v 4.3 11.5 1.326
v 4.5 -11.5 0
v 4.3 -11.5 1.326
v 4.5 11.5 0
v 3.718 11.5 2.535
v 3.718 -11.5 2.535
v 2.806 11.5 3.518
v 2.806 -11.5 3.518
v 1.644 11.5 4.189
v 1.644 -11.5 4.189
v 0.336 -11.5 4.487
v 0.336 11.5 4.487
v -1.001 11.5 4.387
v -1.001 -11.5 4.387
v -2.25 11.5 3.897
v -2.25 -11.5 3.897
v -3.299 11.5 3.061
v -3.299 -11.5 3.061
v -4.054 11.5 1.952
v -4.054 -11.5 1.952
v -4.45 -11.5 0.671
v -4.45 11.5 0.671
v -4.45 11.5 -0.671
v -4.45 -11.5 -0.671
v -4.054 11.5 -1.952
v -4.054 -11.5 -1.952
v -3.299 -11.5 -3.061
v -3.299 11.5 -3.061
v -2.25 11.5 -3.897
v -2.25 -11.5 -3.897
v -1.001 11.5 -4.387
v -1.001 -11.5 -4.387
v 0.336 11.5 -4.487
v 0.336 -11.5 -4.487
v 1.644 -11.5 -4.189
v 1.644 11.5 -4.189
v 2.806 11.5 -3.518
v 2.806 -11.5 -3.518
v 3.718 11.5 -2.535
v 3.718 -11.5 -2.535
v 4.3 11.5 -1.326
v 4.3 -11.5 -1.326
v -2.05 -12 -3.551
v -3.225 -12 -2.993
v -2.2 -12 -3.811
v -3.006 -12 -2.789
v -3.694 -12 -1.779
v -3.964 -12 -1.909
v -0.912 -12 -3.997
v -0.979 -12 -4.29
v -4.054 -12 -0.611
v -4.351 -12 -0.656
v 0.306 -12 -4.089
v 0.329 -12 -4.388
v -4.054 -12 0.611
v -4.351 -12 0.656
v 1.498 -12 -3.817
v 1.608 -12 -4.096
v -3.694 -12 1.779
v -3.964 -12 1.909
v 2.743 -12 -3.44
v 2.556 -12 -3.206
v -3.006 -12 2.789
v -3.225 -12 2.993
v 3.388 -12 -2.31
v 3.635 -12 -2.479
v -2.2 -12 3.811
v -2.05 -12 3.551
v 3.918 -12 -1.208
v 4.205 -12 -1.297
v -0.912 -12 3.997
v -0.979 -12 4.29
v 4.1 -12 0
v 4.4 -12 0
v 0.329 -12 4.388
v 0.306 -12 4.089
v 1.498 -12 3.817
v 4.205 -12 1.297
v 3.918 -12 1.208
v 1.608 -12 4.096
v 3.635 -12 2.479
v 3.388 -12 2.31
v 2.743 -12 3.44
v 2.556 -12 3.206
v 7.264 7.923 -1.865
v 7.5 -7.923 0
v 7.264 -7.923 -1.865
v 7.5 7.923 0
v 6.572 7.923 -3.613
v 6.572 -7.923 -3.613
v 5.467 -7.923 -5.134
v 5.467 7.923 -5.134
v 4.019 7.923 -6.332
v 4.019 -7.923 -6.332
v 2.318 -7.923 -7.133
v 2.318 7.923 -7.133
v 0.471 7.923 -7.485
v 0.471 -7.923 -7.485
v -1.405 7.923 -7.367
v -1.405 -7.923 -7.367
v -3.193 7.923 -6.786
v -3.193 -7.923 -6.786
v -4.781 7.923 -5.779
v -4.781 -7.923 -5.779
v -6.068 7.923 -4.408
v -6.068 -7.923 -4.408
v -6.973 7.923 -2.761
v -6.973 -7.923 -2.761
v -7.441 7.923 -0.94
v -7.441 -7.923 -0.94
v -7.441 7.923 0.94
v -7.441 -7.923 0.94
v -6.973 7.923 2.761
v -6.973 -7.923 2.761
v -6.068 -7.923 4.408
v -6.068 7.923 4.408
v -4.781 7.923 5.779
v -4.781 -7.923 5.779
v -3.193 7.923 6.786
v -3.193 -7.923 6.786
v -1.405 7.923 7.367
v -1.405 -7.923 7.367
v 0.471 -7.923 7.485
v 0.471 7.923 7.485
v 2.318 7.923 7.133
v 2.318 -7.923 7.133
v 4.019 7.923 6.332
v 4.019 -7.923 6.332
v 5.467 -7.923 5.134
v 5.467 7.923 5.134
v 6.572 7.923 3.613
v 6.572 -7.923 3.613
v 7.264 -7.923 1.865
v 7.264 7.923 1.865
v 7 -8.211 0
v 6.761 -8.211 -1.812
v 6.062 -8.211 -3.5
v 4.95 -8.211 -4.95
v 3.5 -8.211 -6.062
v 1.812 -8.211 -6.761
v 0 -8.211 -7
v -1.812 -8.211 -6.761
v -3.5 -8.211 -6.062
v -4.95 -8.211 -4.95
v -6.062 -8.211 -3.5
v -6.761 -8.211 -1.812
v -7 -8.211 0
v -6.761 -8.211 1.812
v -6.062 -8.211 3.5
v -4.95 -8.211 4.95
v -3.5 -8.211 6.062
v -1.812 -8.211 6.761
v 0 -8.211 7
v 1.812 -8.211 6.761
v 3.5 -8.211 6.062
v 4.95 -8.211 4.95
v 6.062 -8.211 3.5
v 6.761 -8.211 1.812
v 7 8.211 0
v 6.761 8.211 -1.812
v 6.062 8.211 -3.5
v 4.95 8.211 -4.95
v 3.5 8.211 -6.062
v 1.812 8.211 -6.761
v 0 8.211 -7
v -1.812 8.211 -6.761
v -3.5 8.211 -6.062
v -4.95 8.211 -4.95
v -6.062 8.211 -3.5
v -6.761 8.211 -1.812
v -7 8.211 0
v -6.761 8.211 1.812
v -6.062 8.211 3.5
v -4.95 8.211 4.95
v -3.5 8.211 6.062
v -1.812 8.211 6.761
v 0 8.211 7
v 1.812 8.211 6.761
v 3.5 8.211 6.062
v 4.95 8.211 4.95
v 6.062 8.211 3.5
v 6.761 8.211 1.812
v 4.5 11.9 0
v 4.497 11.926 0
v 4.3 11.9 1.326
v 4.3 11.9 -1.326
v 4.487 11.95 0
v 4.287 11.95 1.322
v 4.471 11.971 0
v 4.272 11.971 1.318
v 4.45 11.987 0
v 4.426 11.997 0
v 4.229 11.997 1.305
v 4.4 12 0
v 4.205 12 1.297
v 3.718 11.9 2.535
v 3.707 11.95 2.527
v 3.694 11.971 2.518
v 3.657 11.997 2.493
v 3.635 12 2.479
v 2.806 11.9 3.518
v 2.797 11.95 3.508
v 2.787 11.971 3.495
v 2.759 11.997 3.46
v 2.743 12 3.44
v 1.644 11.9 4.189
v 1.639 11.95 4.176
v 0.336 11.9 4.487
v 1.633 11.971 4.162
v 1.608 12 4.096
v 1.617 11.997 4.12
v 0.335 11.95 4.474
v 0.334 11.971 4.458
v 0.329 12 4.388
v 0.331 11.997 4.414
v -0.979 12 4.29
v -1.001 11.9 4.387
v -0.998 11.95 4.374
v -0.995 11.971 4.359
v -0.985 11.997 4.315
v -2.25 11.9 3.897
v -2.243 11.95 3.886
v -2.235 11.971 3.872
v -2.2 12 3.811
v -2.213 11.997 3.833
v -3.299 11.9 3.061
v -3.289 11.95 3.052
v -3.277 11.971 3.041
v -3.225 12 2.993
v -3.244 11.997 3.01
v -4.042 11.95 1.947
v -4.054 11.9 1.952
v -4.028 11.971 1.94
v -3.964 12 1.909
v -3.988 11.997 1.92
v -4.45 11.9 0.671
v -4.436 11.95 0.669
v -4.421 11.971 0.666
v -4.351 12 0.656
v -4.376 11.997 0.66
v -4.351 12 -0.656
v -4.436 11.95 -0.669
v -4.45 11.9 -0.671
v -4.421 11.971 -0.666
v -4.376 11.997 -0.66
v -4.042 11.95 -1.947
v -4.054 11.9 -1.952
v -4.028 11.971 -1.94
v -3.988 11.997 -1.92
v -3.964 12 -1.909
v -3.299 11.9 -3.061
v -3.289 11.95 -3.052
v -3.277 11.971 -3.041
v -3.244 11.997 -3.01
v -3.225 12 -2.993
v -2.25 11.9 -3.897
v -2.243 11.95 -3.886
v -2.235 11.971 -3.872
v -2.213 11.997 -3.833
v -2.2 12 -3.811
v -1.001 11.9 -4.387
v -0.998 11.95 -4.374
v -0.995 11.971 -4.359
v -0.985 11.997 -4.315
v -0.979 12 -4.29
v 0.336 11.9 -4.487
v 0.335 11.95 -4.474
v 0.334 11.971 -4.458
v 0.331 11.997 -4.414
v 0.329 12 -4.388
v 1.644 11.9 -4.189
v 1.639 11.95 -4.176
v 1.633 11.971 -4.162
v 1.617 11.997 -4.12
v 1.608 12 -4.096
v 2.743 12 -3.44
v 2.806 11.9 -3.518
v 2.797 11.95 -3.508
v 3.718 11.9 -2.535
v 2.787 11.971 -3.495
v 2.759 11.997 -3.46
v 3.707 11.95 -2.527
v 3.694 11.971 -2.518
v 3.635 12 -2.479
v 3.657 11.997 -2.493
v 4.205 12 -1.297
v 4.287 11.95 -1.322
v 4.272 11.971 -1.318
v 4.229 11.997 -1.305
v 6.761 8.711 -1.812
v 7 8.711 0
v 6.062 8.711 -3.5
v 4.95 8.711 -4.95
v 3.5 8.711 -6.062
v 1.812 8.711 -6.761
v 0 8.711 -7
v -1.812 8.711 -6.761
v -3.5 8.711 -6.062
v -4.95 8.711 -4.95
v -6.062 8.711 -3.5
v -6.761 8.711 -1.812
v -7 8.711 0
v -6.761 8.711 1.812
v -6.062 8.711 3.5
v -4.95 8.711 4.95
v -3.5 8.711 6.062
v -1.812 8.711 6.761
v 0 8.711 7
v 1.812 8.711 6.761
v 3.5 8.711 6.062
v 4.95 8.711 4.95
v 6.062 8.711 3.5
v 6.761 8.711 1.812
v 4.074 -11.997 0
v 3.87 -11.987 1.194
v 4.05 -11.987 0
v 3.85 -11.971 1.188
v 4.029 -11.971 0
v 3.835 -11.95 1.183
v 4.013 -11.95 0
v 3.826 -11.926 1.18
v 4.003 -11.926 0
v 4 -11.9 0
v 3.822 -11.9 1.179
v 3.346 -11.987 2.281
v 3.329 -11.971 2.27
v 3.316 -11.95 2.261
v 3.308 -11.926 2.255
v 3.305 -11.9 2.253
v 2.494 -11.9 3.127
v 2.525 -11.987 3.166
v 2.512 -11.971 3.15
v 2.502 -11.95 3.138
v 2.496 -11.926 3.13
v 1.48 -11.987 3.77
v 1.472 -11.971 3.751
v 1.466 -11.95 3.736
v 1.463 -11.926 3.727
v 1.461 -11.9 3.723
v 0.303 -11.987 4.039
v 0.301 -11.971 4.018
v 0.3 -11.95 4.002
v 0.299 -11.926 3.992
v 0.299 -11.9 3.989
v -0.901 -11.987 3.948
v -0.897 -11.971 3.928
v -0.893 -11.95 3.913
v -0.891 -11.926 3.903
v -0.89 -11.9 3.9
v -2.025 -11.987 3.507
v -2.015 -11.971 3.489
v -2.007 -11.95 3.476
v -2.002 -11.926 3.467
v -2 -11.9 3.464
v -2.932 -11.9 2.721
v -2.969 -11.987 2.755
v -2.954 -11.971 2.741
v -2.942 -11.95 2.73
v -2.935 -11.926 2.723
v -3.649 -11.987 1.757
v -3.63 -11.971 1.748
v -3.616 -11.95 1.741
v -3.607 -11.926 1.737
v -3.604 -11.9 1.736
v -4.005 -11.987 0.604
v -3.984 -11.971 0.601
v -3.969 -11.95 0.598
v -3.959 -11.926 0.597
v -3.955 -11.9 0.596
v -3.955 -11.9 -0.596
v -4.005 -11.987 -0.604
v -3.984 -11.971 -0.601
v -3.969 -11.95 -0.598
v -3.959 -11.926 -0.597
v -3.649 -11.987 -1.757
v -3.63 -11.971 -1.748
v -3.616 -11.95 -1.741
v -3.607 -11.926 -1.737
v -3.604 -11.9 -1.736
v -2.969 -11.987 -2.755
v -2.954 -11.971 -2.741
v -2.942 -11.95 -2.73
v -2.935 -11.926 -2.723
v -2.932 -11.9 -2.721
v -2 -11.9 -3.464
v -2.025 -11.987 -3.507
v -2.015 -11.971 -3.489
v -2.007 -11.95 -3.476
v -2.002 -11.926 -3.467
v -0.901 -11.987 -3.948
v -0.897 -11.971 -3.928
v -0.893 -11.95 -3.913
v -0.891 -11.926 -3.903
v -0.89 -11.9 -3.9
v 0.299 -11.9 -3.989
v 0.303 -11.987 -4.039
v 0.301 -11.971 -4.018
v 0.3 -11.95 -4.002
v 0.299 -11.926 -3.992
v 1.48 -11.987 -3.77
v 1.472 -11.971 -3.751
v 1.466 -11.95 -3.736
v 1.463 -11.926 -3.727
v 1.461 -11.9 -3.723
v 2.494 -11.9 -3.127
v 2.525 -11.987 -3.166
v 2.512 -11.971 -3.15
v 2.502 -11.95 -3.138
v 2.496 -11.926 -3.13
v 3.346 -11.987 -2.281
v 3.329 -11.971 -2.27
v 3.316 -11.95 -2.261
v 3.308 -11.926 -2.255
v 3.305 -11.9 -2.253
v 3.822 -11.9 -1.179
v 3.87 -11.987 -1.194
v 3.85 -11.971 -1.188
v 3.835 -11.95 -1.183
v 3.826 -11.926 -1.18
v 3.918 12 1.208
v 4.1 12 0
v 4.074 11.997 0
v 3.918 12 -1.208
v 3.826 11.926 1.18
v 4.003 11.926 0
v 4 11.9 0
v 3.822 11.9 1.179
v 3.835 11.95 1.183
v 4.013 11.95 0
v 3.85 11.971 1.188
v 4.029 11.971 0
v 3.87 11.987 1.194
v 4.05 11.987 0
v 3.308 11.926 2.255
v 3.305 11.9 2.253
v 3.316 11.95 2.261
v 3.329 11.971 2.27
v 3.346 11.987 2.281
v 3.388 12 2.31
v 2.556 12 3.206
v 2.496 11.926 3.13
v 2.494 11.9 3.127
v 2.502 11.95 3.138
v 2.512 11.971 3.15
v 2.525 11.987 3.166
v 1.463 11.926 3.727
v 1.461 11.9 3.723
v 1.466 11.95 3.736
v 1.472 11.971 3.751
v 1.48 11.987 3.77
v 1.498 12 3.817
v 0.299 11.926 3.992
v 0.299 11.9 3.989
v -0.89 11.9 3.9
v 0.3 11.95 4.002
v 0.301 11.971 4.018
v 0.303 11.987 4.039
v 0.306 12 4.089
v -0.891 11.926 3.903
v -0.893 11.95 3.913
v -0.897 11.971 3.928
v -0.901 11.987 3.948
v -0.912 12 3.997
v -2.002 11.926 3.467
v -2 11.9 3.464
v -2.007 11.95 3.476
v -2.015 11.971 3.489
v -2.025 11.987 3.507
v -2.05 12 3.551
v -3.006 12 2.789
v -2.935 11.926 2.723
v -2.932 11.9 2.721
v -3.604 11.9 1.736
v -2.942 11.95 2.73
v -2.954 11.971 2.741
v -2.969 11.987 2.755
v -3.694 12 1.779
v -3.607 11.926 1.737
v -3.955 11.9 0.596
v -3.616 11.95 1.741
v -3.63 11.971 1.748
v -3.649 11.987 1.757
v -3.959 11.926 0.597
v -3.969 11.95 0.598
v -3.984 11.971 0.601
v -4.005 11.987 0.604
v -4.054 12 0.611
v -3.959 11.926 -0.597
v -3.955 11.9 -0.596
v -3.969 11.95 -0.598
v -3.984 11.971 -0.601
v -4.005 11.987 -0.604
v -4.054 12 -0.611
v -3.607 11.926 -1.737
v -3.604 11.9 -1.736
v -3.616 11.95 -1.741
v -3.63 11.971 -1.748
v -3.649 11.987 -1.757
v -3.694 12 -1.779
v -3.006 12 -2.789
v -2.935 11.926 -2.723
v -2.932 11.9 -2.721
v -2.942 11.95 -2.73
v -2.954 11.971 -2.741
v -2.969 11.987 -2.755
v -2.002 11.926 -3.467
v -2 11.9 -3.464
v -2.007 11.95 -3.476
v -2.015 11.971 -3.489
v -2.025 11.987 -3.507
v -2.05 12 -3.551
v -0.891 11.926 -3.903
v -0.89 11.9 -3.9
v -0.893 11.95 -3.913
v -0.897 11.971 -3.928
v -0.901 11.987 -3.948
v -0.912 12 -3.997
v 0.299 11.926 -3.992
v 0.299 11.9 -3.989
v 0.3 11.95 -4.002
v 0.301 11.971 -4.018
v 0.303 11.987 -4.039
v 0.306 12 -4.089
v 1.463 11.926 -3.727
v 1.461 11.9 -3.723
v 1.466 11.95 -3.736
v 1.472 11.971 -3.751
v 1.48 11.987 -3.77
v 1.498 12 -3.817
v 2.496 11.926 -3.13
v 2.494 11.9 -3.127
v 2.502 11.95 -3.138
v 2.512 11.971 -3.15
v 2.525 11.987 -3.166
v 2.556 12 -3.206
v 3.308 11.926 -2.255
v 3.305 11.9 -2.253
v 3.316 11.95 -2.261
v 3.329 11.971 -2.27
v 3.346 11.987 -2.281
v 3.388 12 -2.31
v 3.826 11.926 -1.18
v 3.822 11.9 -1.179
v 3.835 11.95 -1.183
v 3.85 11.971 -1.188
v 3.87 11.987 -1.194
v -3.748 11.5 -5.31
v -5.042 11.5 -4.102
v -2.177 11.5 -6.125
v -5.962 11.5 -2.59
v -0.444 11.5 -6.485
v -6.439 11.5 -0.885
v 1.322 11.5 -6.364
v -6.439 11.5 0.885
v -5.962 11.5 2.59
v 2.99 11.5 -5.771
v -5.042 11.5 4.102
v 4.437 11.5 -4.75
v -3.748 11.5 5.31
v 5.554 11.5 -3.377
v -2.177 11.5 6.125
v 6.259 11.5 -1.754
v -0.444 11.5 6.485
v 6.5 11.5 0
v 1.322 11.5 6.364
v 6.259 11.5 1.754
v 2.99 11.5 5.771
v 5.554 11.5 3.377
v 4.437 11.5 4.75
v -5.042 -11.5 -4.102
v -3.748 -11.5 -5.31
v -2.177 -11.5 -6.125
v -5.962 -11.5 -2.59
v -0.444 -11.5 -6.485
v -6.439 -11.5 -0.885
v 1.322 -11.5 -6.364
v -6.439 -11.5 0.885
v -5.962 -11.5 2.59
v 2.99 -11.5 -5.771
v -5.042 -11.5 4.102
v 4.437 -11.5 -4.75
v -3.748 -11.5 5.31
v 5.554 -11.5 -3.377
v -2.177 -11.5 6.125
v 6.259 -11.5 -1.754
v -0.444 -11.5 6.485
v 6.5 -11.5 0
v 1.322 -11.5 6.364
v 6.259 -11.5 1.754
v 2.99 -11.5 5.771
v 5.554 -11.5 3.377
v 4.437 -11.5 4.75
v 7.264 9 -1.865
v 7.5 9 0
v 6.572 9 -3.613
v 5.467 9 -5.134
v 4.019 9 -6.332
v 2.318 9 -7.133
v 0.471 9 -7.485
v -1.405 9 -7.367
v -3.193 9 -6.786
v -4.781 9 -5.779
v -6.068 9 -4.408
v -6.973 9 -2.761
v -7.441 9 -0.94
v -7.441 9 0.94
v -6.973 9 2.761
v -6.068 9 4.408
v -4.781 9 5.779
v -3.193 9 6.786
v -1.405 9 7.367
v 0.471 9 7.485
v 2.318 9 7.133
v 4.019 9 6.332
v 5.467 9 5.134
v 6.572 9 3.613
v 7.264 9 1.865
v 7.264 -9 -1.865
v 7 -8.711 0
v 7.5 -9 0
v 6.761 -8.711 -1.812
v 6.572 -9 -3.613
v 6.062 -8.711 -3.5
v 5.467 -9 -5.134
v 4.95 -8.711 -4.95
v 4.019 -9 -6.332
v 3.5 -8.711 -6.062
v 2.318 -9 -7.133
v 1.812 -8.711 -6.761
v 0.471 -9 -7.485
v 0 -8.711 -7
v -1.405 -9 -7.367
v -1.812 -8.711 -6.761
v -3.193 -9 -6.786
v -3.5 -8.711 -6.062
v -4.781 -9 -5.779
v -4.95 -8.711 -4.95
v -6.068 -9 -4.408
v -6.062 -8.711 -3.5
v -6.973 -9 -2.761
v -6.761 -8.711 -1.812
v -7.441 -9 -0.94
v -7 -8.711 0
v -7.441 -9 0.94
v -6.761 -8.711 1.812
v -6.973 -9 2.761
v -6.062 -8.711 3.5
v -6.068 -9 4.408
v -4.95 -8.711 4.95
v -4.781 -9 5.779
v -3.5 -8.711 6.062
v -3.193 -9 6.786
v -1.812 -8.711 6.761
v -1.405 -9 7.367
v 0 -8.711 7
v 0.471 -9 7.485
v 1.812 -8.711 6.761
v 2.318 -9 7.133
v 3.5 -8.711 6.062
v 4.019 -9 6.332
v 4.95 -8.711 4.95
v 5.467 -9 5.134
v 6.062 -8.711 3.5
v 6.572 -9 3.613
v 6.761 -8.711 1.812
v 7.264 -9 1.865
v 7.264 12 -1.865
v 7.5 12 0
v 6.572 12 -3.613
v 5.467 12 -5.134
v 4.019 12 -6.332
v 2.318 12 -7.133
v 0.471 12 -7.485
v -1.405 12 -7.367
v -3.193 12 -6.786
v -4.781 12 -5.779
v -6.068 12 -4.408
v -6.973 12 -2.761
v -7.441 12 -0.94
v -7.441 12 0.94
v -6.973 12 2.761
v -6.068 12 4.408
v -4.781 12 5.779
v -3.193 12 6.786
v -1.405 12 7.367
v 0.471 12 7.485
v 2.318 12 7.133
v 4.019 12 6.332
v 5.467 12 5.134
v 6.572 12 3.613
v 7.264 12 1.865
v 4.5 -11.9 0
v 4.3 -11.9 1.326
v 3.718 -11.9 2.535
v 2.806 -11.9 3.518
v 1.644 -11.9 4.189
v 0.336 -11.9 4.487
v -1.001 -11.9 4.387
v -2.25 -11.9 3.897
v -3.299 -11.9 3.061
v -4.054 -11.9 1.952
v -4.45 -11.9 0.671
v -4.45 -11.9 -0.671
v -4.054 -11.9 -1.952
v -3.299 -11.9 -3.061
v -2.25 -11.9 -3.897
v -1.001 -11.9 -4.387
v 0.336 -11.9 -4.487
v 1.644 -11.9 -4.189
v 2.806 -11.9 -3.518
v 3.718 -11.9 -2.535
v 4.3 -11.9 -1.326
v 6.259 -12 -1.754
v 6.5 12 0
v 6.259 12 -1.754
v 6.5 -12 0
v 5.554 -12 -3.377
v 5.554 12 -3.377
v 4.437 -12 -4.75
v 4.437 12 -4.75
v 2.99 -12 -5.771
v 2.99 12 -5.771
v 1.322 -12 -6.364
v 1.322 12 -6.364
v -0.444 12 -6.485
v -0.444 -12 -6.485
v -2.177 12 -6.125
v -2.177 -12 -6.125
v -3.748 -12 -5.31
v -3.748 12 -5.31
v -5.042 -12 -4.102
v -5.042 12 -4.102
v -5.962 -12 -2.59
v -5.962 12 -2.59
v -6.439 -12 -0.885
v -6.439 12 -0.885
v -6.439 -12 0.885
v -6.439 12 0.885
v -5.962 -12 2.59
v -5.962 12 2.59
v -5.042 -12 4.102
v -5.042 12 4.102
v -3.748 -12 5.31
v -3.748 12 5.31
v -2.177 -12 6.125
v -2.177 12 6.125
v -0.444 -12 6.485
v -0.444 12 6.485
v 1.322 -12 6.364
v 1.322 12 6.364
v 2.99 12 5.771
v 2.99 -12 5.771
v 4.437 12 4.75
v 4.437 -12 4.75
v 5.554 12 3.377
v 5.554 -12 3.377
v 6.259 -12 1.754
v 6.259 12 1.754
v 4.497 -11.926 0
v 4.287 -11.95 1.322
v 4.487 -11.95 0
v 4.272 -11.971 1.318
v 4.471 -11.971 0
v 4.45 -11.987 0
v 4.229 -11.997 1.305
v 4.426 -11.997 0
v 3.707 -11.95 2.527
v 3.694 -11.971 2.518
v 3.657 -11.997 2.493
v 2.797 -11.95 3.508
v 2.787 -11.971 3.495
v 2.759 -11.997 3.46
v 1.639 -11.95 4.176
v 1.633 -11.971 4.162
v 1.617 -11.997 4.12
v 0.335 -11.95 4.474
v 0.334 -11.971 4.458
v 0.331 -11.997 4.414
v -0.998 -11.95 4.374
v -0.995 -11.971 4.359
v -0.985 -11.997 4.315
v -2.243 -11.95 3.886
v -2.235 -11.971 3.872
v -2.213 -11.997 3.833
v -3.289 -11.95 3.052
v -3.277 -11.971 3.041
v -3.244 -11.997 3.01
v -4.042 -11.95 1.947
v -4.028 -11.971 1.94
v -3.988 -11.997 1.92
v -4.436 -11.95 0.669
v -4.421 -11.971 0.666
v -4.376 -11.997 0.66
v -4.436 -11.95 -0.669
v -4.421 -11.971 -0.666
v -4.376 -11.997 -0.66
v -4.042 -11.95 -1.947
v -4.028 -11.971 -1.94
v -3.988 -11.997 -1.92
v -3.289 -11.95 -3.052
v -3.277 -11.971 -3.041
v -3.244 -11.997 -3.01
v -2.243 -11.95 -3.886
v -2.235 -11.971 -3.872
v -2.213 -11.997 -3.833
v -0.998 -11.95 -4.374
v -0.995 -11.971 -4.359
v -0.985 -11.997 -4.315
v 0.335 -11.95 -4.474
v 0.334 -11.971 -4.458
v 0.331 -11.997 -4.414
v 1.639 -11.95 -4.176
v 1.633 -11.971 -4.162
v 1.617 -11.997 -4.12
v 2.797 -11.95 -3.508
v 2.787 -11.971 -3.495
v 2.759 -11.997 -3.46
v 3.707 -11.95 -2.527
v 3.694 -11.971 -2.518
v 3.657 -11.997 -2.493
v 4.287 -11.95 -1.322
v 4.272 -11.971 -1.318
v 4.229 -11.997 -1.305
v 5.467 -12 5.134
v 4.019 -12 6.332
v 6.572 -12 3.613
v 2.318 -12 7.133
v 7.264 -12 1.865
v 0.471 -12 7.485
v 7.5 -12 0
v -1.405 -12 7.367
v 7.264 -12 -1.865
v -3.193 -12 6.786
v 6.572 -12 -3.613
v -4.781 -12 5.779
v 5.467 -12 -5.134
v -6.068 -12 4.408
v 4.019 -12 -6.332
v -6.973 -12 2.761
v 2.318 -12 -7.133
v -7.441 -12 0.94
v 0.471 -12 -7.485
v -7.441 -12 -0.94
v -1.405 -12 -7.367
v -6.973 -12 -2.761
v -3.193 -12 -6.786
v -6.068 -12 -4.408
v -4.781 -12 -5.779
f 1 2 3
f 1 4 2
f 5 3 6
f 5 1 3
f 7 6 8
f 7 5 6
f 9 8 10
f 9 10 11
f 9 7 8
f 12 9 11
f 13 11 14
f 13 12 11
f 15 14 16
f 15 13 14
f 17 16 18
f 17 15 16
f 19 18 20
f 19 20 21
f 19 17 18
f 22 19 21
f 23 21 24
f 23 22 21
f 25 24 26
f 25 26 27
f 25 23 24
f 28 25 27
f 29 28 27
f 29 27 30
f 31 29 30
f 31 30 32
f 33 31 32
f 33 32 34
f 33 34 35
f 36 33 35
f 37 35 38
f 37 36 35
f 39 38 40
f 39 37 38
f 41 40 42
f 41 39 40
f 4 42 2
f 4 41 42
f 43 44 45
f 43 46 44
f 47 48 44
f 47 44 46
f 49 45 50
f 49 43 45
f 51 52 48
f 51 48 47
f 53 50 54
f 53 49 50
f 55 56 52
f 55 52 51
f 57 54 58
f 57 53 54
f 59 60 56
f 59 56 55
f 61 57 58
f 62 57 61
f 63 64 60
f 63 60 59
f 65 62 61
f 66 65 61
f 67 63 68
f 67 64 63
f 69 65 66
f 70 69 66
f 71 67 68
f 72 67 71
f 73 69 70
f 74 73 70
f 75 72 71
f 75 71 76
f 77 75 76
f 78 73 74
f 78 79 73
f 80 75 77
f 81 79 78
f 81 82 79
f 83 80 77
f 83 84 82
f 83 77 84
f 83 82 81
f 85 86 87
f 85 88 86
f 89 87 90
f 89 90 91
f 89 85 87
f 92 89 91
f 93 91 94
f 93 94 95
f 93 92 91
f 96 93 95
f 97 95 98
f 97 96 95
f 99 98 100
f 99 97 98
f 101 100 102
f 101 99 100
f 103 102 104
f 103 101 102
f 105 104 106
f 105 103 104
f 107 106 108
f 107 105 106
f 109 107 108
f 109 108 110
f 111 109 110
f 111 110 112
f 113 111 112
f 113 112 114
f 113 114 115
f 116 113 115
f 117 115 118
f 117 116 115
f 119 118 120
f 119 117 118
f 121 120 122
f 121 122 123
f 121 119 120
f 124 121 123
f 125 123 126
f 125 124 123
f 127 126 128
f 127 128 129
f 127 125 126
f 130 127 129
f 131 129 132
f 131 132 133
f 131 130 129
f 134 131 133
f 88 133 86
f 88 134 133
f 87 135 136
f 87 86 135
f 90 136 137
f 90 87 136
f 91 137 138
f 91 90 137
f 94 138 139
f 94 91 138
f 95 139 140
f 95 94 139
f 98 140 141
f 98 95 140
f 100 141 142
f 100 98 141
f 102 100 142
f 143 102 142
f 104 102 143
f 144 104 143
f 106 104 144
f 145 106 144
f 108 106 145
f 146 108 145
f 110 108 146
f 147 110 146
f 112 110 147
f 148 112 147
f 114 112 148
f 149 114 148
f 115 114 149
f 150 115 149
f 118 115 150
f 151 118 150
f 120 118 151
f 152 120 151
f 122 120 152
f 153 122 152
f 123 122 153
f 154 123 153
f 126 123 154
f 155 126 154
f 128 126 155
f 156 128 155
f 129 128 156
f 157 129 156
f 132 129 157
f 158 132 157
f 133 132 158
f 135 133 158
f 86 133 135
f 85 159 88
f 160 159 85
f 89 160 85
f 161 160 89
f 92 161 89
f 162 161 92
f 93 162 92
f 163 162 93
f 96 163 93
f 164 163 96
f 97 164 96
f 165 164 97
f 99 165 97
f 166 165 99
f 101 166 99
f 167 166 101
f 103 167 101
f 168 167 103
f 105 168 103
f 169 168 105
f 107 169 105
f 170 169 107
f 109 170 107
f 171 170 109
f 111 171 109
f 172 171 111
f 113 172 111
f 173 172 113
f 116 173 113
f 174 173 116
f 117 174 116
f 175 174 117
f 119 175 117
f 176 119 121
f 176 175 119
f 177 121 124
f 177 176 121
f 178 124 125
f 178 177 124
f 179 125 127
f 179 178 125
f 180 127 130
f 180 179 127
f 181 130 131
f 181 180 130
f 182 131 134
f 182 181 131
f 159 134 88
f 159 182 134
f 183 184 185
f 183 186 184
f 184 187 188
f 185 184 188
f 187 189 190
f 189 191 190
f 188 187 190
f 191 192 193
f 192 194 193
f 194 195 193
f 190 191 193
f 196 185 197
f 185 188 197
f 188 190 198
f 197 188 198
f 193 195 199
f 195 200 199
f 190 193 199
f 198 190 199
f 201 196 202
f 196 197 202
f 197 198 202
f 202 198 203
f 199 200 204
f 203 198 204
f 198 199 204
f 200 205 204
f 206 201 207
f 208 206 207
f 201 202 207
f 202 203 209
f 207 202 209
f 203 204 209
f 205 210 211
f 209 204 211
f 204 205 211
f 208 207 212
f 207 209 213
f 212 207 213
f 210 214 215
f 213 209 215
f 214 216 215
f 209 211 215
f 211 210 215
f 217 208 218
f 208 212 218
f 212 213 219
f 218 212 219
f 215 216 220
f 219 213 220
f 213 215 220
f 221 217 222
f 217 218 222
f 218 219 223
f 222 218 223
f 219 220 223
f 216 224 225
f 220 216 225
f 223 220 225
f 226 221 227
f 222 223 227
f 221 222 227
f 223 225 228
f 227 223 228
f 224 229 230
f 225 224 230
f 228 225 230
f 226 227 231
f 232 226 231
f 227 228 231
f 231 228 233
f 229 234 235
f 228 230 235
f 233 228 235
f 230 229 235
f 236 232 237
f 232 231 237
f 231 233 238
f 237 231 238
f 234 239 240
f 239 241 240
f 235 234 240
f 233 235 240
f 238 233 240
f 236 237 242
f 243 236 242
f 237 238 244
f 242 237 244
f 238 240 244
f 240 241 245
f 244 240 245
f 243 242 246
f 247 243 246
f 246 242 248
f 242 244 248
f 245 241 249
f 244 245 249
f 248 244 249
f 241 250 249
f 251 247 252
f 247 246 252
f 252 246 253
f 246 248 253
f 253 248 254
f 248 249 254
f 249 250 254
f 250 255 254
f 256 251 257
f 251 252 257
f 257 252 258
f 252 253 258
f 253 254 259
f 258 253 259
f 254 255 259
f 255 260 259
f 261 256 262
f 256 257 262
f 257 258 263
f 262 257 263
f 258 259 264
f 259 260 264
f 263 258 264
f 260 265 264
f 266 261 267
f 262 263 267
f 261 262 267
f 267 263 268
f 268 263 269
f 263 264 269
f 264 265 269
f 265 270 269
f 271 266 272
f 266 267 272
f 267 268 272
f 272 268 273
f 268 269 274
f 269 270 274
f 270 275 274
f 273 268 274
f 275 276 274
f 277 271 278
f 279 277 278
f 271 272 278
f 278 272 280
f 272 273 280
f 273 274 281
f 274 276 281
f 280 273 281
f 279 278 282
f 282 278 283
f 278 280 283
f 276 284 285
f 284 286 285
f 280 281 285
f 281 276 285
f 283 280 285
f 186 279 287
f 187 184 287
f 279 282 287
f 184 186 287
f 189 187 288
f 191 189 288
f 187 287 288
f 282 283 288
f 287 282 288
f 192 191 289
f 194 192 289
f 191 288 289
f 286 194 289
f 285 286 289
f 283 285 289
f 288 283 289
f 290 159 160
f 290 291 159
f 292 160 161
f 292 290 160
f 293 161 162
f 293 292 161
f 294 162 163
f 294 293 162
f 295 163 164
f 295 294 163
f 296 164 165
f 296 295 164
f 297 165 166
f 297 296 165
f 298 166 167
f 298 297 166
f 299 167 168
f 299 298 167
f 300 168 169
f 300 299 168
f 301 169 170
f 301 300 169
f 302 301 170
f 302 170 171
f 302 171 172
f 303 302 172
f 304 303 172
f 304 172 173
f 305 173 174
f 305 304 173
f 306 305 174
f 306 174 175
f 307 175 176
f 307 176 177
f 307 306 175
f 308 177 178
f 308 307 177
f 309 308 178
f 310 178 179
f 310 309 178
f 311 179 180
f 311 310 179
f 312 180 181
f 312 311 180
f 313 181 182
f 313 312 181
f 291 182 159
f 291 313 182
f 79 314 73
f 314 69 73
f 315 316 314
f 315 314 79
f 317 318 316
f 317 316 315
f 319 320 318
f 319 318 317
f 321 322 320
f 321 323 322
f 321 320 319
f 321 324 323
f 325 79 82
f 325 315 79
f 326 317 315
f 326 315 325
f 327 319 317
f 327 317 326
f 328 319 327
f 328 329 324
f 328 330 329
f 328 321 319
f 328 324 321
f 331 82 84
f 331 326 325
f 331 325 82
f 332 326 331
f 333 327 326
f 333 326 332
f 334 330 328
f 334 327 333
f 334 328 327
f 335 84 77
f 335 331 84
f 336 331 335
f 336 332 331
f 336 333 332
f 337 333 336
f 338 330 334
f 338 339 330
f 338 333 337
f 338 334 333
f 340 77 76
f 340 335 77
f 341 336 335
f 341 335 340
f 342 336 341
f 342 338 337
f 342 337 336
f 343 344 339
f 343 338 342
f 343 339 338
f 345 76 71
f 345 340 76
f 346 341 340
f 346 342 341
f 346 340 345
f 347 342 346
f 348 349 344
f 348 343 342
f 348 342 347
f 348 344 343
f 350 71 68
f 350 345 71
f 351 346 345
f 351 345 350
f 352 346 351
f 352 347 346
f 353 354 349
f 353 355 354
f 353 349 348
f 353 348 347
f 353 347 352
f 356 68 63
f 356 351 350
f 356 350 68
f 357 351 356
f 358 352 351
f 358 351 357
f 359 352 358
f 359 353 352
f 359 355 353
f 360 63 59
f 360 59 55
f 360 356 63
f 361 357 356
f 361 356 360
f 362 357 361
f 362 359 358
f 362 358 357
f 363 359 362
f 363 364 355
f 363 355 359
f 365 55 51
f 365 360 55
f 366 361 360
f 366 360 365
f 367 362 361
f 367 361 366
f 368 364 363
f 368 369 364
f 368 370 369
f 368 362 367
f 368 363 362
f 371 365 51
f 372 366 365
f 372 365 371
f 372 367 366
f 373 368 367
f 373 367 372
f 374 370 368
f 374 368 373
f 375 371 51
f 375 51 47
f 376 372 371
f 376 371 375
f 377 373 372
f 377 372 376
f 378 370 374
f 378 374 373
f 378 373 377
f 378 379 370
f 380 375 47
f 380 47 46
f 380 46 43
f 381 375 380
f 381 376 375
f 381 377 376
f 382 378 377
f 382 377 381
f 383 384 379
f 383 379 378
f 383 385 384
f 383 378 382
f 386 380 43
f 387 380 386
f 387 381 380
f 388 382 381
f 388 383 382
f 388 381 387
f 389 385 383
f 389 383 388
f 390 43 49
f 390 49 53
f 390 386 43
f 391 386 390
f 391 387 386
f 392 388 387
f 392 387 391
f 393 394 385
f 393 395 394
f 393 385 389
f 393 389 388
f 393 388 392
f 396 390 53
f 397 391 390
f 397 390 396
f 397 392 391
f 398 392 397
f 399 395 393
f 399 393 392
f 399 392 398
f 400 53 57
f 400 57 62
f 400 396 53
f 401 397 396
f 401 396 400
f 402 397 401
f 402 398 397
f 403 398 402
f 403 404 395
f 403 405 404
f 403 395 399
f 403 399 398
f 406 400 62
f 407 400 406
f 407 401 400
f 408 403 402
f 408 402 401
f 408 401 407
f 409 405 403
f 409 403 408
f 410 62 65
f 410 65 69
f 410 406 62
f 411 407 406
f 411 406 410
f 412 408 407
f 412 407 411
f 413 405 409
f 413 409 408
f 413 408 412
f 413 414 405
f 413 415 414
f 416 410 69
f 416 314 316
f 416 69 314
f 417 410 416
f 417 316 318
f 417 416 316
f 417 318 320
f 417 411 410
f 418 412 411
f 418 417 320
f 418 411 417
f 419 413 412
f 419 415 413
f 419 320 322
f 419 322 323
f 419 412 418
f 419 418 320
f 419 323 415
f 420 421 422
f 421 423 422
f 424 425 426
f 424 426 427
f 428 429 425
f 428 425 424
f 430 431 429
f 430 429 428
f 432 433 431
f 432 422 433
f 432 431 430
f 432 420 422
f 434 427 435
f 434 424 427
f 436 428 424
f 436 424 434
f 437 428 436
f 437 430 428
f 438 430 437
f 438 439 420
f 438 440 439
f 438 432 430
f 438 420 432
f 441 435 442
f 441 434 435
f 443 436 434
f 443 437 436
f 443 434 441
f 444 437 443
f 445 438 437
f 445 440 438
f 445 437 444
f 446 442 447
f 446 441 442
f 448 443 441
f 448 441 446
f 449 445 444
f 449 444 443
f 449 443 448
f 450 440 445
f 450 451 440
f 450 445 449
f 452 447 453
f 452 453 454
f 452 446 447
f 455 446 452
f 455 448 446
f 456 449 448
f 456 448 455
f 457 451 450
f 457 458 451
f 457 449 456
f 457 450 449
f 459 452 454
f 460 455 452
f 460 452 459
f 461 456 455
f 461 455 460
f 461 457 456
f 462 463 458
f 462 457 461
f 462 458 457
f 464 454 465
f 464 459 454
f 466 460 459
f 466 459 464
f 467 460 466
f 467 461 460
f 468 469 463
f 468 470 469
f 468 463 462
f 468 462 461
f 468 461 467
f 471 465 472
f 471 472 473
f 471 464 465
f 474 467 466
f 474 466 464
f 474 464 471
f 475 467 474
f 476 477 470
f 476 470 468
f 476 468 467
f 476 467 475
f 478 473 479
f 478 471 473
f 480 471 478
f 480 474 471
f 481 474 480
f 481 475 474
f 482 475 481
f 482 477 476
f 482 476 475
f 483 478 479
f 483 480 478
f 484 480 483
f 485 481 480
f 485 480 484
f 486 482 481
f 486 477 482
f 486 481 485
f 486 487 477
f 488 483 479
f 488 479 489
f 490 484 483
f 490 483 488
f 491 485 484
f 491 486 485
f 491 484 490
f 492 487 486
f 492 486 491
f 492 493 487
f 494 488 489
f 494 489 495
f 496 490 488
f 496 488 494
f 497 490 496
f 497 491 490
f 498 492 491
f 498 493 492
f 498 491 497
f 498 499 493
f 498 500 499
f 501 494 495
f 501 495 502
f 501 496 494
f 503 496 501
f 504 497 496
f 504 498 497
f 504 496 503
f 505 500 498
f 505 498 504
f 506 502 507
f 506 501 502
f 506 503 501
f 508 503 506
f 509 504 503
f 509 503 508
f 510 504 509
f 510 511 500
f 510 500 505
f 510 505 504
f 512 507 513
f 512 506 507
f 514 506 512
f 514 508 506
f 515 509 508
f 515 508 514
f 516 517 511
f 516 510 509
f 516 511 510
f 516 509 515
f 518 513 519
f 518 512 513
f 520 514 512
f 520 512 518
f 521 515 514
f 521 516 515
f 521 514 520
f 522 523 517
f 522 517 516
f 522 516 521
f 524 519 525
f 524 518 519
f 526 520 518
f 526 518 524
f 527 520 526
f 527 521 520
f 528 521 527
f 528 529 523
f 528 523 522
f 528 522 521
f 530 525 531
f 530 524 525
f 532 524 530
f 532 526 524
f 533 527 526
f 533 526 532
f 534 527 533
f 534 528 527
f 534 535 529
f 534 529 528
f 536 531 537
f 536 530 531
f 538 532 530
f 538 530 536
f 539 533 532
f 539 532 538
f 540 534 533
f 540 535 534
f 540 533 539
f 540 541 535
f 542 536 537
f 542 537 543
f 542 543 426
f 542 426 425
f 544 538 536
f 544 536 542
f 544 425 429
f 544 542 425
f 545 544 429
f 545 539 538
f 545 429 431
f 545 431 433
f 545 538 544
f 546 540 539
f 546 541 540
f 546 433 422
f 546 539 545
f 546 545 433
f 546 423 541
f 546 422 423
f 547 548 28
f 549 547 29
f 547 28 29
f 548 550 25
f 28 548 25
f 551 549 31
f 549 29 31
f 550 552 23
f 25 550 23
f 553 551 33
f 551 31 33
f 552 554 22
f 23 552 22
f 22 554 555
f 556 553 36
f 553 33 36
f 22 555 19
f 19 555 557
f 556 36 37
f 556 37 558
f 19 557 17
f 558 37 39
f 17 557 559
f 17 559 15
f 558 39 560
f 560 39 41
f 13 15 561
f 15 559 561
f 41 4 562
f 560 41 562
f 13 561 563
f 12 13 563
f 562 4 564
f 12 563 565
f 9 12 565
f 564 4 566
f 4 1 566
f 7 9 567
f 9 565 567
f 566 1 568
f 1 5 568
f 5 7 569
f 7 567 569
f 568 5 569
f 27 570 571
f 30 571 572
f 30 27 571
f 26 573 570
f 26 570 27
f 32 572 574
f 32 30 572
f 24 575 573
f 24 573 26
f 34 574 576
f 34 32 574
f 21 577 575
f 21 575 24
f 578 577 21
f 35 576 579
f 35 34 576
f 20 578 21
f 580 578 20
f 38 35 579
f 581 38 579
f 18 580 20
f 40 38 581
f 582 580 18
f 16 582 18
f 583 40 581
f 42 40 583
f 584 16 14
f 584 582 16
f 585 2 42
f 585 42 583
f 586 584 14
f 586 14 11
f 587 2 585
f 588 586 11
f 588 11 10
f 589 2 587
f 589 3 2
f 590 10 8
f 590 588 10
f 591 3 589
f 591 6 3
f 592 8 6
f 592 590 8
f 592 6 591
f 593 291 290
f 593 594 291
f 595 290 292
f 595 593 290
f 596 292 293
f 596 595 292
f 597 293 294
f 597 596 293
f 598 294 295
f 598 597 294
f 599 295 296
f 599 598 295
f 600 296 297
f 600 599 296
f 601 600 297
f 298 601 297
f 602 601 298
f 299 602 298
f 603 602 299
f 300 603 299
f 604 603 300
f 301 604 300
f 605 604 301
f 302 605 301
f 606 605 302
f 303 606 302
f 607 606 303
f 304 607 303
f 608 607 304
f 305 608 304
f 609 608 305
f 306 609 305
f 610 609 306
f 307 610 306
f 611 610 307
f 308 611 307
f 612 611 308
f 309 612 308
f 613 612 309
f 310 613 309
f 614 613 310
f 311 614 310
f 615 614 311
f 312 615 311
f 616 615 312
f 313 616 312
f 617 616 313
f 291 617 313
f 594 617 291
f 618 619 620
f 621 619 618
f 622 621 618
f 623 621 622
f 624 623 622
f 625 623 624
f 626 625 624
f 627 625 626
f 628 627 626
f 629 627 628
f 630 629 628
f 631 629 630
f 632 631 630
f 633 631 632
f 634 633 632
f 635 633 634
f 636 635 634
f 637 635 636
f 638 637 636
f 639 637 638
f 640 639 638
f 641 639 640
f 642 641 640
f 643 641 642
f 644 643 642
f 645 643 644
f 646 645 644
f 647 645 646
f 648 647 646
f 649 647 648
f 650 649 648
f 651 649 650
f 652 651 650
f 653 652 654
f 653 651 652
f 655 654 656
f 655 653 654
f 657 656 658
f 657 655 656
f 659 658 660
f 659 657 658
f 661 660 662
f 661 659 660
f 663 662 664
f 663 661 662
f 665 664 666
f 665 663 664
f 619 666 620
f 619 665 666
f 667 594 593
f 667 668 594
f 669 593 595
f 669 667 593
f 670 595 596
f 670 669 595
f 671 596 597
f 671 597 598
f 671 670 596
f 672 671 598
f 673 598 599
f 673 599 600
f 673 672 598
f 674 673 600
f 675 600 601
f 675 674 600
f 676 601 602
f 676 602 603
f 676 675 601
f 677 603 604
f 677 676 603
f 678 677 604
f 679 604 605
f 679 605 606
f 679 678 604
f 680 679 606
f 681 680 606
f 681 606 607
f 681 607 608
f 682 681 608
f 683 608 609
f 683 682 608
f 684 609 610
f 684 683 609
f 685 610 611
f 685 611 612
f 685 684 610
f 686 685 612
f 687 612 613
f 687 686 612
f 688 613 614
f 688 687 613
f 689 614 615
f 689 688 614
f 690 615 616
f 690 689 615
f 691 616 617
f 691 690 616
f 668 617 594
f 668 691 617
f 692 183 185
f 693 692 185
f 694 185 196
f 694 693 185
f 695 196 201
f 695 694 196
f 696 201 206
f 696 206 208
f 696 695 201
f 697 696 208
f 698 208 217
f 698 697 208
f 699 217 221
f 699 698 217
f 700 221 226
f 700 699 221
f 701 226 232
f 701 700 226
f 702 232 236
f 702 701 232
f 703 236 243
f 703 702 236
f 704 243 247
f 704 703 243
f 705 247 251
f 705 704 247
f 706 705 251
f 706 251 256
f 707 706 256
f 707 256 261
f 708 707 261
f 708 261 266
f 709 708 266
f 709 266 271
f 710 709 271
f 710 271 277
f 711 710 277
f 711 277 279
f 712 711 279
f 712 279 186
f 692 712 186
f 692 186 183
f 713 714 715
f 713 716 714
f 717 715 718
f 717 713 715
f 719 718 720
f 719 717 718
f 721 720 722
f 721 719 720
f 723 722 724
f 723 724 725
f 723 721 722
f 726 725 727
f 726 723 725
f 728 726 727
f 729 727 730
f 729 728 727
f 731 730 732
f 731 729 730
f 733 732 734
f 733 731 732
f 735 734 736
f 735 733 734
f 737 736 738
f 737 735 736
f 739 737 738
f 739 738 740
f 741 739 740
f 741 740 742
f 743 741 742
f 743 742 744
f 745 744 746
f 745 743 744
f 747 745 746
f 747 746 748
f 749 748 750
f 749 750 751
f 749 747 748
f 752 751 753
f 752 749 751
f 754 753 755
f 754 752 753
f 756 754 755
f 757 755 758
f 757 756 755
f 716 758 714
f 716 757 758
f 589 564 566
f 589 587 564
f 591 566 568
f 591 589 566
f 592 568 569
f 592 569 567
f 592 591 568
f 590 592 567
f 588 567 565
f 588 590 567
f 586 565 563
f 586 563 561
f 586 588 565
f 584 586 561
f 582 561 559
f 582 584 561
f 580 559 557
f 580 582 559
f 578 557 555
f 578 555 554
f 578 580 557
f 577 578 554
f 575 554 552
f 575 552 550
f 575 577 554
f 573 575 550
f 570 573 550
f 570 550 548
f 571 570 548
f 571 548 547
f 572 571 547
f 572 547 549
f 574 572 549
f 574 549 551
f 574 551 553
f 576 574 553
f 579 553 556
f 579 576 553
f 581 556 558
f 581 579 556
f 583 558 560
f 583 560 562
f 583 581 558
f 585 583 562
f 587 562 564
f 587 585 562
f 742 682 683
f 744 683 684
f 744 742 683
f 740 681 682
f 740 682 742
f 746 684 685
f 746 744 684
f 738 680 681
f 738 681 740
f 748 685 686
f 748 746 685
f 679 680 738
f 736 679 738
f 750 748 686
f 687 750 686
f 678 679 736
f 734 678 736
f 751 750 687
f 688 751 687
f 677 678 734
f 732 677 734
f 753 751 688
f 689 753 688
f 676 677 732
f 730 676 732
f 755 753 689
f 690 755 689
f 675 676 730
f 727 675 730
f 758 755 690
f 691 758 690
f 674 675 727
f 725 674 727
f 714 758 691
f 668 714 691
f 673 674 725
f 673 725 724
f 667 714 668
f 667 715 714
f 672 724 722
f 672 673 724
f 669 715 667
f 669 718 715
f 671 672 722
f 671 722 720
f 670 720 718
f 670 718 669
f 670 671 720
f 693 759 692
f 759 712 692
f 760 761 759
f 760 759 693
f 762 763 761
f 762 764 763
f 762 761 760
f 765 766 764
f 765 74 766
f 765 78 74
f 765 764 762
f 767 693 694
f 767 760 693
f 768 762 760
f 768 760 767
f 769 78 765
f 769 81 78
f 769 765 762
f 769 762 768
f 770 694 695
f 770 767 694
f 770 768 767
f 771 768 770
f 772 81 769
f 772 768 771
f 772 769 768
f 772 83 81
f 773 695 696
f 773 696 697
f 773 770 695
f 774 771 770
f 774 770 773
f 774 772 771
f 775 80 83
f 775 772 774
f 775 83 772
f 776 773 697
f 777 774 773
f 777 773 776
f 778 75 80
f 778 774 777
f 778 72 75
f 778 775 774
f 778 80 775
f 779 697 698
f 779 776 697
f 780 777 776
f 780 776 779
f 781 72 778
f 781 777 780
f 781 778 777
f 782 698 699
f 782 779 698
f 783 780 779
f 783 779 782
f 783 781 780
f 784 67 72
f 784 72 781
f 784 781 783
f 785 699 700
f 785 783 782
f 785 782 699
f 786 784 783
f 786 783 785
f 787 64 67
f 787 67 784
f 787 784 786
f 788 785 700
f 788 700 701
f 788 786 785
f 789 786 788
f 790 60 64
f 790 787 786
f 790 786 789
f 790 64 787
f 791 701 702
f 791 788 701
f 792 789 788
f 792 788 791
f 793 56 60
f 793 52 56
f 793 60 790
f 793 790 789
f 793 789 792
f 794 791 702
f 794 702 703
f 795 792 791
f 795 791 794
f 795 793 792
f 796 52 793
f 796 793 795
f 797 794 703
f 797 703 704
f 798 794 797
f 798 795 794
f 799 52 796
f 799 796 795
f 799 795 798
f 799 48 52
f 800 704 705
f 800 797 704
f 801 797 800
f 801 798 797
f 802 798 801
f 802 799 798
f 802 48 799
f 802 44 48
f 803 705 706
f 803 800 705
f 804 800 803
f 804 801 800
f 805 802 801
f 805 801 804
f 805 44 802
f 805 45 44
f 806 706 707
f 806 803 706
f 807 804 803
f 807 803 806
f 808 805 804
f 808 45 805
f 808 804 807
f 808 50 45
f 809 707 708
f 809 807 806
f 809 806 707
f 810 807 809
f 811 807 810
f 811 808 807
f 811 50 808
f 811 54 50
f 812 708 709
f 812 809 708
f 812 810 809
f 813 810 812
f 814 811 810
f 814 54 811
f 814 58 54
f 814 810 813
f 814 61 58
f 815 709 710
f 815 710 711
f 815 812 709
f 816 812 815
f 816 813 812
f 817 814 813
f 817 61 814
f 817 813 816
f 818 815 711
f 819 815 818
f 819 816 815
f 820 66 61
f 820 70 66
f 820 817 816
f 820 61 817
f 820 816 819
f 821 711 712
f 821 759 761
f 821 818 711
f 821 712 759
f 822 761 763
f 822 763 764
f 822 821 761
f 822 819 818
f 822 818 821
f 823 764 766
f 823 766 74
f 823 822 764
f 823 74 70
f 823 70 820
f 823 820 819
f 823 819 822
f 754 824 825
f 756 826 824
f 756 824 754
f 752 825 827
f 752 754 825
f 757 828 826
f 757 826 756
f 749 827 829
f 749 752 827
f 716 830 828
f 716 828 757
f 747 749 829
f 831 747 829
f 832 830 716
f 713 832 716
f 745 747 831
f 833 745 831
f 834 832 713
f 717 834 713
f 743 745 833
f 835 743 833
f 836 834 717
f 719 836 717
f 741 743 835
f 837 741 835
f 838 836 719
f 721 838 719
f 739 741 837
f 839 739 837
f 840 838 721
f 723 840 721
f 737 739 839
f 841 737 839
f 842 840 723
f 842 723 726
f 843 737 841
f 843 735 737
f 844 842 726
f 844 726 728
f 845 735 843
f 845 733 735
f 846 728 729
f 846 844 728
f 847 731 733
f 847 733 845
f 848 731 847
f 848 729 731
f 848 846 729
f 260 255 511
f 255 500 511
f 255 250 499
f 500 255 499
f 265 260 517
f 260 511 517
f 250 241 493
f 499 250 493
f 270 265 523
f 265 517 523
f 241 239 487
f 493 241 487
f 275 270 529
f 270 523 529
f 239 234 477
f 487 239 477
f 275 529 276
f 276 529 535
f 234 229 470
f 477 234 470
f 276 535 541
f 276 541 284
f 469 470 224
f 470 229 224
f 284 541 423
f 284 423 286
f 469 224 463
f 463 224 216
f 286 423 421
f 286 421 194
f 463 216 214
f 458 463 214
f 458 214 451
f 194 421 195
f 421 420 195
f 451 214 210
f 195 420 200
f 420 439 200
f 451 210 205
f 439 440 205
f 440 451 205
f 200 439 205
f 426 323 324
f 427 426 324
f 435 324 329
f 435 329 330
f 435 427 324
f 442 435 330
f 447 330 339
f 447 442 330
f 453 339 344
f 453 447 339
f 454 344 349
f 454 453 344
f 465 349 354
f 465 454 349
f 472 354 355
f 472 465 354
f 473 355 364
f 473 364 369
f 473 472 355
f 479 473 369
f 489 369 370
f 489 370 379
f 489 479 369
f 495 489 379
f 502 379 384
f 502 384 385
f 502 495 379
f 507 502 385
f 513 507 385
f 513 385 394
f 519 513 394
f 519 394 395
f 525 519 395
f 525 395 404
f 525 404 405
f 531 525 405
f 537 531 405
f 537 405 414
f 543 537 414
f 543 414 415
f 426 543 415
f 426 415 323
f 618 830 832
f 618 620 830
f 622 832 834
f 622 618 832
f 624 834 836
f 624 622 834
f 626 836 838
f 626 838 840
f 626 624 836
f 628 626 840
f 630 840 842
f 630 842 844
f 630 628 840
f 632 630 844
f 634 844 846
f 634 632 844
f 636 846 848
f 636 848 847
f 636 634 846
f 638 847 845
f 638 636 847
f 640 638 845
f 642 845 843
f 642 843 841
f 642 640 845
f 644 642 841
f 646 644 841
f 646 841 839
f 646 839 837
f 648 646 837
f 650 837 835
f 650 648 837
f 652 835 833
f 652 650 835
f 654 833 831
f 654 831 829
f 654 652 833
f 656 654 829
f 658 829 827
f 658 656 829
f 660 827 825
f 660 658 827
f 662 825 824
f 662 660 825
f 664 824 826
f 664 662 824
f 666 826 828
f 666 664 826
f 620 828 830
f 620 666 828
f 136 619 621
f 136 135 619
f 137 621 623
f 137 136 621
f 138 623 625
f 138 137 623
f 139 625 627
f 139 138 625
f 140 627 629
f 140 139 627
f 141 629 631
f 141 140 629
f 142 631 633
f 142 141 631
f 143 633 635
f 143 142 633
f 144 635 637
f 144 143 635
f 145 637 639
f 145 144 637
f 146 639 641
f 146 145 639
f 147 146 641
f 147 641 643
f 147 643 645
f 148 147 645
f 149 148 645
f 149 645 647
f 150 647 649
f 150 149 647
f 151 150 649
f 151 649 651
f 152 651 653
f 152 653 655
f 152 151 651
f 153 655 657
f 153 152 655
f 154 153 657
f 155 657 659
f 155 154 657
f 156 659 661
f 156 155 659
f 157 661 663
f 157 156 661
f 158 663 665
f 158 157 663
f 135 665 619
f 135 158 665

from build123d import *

# Parameters (mm, degrees)
SKETCH_R      = 4.5
SKETCH_R_2    = 4
PAD_DEPTH     = 12
FILLET001_R   = 0.1
SKETCH001_R   = 6.5
SKETCH001_R_2 = 4.5
PAD001_DEPTH  = 11.5


with BuildPart() as body:
    # Sketch → Pad (new body, symmetric)
    with BuildSketch(Plane.XZ):
        Circle(SKETCH_R)
        Circle(SKETCH_R_2, mode=Mode.SUBTRACT)
    extrude(amount=PAD_DEPTH, both=True)

    # Fillet001
    fillet001_edges = [body.edges().sort_by_distance(p)[0] for p in [
        (-4.5, 12, 0),
        (-4, 12, 0),
        (-4.5, -12, 0),
        (-4, -12, 0),
    ]]
    fillet(fillet001_edges, radius=FILLET001_R)


with BuildPart() as body001:
    # Sketch001 → Pad001 (new body, symmetric)
    with BuildSketch(Plane.XZ):
        Circle(SKETCH001_R)
        Circle(SKETCH001_R_2, mode=Mode.SUBTRACT)
    extrude(amount=PAD001_DEPTH, both=True)


with BuildPart() as body002:
    # Sketch002 → Revolution (revolve)
    with BuildSketch(Plane.XY):
        Polygon((6.5, 12), (6.5, -12), (7.5, -12), (7.5, -9), (7, -8.711325), (7, -8.211325), (7.5, -7.92265), (7.5, 7.92265), (7, 8.211325), (7, 8.711325), (7.5, 9), (7.5, 12), align=None)
    revolve(axis=Axis((0, 0, 0), (0, 1, 0)))


solid = Compound([body.part, body001.part, body002.part])
